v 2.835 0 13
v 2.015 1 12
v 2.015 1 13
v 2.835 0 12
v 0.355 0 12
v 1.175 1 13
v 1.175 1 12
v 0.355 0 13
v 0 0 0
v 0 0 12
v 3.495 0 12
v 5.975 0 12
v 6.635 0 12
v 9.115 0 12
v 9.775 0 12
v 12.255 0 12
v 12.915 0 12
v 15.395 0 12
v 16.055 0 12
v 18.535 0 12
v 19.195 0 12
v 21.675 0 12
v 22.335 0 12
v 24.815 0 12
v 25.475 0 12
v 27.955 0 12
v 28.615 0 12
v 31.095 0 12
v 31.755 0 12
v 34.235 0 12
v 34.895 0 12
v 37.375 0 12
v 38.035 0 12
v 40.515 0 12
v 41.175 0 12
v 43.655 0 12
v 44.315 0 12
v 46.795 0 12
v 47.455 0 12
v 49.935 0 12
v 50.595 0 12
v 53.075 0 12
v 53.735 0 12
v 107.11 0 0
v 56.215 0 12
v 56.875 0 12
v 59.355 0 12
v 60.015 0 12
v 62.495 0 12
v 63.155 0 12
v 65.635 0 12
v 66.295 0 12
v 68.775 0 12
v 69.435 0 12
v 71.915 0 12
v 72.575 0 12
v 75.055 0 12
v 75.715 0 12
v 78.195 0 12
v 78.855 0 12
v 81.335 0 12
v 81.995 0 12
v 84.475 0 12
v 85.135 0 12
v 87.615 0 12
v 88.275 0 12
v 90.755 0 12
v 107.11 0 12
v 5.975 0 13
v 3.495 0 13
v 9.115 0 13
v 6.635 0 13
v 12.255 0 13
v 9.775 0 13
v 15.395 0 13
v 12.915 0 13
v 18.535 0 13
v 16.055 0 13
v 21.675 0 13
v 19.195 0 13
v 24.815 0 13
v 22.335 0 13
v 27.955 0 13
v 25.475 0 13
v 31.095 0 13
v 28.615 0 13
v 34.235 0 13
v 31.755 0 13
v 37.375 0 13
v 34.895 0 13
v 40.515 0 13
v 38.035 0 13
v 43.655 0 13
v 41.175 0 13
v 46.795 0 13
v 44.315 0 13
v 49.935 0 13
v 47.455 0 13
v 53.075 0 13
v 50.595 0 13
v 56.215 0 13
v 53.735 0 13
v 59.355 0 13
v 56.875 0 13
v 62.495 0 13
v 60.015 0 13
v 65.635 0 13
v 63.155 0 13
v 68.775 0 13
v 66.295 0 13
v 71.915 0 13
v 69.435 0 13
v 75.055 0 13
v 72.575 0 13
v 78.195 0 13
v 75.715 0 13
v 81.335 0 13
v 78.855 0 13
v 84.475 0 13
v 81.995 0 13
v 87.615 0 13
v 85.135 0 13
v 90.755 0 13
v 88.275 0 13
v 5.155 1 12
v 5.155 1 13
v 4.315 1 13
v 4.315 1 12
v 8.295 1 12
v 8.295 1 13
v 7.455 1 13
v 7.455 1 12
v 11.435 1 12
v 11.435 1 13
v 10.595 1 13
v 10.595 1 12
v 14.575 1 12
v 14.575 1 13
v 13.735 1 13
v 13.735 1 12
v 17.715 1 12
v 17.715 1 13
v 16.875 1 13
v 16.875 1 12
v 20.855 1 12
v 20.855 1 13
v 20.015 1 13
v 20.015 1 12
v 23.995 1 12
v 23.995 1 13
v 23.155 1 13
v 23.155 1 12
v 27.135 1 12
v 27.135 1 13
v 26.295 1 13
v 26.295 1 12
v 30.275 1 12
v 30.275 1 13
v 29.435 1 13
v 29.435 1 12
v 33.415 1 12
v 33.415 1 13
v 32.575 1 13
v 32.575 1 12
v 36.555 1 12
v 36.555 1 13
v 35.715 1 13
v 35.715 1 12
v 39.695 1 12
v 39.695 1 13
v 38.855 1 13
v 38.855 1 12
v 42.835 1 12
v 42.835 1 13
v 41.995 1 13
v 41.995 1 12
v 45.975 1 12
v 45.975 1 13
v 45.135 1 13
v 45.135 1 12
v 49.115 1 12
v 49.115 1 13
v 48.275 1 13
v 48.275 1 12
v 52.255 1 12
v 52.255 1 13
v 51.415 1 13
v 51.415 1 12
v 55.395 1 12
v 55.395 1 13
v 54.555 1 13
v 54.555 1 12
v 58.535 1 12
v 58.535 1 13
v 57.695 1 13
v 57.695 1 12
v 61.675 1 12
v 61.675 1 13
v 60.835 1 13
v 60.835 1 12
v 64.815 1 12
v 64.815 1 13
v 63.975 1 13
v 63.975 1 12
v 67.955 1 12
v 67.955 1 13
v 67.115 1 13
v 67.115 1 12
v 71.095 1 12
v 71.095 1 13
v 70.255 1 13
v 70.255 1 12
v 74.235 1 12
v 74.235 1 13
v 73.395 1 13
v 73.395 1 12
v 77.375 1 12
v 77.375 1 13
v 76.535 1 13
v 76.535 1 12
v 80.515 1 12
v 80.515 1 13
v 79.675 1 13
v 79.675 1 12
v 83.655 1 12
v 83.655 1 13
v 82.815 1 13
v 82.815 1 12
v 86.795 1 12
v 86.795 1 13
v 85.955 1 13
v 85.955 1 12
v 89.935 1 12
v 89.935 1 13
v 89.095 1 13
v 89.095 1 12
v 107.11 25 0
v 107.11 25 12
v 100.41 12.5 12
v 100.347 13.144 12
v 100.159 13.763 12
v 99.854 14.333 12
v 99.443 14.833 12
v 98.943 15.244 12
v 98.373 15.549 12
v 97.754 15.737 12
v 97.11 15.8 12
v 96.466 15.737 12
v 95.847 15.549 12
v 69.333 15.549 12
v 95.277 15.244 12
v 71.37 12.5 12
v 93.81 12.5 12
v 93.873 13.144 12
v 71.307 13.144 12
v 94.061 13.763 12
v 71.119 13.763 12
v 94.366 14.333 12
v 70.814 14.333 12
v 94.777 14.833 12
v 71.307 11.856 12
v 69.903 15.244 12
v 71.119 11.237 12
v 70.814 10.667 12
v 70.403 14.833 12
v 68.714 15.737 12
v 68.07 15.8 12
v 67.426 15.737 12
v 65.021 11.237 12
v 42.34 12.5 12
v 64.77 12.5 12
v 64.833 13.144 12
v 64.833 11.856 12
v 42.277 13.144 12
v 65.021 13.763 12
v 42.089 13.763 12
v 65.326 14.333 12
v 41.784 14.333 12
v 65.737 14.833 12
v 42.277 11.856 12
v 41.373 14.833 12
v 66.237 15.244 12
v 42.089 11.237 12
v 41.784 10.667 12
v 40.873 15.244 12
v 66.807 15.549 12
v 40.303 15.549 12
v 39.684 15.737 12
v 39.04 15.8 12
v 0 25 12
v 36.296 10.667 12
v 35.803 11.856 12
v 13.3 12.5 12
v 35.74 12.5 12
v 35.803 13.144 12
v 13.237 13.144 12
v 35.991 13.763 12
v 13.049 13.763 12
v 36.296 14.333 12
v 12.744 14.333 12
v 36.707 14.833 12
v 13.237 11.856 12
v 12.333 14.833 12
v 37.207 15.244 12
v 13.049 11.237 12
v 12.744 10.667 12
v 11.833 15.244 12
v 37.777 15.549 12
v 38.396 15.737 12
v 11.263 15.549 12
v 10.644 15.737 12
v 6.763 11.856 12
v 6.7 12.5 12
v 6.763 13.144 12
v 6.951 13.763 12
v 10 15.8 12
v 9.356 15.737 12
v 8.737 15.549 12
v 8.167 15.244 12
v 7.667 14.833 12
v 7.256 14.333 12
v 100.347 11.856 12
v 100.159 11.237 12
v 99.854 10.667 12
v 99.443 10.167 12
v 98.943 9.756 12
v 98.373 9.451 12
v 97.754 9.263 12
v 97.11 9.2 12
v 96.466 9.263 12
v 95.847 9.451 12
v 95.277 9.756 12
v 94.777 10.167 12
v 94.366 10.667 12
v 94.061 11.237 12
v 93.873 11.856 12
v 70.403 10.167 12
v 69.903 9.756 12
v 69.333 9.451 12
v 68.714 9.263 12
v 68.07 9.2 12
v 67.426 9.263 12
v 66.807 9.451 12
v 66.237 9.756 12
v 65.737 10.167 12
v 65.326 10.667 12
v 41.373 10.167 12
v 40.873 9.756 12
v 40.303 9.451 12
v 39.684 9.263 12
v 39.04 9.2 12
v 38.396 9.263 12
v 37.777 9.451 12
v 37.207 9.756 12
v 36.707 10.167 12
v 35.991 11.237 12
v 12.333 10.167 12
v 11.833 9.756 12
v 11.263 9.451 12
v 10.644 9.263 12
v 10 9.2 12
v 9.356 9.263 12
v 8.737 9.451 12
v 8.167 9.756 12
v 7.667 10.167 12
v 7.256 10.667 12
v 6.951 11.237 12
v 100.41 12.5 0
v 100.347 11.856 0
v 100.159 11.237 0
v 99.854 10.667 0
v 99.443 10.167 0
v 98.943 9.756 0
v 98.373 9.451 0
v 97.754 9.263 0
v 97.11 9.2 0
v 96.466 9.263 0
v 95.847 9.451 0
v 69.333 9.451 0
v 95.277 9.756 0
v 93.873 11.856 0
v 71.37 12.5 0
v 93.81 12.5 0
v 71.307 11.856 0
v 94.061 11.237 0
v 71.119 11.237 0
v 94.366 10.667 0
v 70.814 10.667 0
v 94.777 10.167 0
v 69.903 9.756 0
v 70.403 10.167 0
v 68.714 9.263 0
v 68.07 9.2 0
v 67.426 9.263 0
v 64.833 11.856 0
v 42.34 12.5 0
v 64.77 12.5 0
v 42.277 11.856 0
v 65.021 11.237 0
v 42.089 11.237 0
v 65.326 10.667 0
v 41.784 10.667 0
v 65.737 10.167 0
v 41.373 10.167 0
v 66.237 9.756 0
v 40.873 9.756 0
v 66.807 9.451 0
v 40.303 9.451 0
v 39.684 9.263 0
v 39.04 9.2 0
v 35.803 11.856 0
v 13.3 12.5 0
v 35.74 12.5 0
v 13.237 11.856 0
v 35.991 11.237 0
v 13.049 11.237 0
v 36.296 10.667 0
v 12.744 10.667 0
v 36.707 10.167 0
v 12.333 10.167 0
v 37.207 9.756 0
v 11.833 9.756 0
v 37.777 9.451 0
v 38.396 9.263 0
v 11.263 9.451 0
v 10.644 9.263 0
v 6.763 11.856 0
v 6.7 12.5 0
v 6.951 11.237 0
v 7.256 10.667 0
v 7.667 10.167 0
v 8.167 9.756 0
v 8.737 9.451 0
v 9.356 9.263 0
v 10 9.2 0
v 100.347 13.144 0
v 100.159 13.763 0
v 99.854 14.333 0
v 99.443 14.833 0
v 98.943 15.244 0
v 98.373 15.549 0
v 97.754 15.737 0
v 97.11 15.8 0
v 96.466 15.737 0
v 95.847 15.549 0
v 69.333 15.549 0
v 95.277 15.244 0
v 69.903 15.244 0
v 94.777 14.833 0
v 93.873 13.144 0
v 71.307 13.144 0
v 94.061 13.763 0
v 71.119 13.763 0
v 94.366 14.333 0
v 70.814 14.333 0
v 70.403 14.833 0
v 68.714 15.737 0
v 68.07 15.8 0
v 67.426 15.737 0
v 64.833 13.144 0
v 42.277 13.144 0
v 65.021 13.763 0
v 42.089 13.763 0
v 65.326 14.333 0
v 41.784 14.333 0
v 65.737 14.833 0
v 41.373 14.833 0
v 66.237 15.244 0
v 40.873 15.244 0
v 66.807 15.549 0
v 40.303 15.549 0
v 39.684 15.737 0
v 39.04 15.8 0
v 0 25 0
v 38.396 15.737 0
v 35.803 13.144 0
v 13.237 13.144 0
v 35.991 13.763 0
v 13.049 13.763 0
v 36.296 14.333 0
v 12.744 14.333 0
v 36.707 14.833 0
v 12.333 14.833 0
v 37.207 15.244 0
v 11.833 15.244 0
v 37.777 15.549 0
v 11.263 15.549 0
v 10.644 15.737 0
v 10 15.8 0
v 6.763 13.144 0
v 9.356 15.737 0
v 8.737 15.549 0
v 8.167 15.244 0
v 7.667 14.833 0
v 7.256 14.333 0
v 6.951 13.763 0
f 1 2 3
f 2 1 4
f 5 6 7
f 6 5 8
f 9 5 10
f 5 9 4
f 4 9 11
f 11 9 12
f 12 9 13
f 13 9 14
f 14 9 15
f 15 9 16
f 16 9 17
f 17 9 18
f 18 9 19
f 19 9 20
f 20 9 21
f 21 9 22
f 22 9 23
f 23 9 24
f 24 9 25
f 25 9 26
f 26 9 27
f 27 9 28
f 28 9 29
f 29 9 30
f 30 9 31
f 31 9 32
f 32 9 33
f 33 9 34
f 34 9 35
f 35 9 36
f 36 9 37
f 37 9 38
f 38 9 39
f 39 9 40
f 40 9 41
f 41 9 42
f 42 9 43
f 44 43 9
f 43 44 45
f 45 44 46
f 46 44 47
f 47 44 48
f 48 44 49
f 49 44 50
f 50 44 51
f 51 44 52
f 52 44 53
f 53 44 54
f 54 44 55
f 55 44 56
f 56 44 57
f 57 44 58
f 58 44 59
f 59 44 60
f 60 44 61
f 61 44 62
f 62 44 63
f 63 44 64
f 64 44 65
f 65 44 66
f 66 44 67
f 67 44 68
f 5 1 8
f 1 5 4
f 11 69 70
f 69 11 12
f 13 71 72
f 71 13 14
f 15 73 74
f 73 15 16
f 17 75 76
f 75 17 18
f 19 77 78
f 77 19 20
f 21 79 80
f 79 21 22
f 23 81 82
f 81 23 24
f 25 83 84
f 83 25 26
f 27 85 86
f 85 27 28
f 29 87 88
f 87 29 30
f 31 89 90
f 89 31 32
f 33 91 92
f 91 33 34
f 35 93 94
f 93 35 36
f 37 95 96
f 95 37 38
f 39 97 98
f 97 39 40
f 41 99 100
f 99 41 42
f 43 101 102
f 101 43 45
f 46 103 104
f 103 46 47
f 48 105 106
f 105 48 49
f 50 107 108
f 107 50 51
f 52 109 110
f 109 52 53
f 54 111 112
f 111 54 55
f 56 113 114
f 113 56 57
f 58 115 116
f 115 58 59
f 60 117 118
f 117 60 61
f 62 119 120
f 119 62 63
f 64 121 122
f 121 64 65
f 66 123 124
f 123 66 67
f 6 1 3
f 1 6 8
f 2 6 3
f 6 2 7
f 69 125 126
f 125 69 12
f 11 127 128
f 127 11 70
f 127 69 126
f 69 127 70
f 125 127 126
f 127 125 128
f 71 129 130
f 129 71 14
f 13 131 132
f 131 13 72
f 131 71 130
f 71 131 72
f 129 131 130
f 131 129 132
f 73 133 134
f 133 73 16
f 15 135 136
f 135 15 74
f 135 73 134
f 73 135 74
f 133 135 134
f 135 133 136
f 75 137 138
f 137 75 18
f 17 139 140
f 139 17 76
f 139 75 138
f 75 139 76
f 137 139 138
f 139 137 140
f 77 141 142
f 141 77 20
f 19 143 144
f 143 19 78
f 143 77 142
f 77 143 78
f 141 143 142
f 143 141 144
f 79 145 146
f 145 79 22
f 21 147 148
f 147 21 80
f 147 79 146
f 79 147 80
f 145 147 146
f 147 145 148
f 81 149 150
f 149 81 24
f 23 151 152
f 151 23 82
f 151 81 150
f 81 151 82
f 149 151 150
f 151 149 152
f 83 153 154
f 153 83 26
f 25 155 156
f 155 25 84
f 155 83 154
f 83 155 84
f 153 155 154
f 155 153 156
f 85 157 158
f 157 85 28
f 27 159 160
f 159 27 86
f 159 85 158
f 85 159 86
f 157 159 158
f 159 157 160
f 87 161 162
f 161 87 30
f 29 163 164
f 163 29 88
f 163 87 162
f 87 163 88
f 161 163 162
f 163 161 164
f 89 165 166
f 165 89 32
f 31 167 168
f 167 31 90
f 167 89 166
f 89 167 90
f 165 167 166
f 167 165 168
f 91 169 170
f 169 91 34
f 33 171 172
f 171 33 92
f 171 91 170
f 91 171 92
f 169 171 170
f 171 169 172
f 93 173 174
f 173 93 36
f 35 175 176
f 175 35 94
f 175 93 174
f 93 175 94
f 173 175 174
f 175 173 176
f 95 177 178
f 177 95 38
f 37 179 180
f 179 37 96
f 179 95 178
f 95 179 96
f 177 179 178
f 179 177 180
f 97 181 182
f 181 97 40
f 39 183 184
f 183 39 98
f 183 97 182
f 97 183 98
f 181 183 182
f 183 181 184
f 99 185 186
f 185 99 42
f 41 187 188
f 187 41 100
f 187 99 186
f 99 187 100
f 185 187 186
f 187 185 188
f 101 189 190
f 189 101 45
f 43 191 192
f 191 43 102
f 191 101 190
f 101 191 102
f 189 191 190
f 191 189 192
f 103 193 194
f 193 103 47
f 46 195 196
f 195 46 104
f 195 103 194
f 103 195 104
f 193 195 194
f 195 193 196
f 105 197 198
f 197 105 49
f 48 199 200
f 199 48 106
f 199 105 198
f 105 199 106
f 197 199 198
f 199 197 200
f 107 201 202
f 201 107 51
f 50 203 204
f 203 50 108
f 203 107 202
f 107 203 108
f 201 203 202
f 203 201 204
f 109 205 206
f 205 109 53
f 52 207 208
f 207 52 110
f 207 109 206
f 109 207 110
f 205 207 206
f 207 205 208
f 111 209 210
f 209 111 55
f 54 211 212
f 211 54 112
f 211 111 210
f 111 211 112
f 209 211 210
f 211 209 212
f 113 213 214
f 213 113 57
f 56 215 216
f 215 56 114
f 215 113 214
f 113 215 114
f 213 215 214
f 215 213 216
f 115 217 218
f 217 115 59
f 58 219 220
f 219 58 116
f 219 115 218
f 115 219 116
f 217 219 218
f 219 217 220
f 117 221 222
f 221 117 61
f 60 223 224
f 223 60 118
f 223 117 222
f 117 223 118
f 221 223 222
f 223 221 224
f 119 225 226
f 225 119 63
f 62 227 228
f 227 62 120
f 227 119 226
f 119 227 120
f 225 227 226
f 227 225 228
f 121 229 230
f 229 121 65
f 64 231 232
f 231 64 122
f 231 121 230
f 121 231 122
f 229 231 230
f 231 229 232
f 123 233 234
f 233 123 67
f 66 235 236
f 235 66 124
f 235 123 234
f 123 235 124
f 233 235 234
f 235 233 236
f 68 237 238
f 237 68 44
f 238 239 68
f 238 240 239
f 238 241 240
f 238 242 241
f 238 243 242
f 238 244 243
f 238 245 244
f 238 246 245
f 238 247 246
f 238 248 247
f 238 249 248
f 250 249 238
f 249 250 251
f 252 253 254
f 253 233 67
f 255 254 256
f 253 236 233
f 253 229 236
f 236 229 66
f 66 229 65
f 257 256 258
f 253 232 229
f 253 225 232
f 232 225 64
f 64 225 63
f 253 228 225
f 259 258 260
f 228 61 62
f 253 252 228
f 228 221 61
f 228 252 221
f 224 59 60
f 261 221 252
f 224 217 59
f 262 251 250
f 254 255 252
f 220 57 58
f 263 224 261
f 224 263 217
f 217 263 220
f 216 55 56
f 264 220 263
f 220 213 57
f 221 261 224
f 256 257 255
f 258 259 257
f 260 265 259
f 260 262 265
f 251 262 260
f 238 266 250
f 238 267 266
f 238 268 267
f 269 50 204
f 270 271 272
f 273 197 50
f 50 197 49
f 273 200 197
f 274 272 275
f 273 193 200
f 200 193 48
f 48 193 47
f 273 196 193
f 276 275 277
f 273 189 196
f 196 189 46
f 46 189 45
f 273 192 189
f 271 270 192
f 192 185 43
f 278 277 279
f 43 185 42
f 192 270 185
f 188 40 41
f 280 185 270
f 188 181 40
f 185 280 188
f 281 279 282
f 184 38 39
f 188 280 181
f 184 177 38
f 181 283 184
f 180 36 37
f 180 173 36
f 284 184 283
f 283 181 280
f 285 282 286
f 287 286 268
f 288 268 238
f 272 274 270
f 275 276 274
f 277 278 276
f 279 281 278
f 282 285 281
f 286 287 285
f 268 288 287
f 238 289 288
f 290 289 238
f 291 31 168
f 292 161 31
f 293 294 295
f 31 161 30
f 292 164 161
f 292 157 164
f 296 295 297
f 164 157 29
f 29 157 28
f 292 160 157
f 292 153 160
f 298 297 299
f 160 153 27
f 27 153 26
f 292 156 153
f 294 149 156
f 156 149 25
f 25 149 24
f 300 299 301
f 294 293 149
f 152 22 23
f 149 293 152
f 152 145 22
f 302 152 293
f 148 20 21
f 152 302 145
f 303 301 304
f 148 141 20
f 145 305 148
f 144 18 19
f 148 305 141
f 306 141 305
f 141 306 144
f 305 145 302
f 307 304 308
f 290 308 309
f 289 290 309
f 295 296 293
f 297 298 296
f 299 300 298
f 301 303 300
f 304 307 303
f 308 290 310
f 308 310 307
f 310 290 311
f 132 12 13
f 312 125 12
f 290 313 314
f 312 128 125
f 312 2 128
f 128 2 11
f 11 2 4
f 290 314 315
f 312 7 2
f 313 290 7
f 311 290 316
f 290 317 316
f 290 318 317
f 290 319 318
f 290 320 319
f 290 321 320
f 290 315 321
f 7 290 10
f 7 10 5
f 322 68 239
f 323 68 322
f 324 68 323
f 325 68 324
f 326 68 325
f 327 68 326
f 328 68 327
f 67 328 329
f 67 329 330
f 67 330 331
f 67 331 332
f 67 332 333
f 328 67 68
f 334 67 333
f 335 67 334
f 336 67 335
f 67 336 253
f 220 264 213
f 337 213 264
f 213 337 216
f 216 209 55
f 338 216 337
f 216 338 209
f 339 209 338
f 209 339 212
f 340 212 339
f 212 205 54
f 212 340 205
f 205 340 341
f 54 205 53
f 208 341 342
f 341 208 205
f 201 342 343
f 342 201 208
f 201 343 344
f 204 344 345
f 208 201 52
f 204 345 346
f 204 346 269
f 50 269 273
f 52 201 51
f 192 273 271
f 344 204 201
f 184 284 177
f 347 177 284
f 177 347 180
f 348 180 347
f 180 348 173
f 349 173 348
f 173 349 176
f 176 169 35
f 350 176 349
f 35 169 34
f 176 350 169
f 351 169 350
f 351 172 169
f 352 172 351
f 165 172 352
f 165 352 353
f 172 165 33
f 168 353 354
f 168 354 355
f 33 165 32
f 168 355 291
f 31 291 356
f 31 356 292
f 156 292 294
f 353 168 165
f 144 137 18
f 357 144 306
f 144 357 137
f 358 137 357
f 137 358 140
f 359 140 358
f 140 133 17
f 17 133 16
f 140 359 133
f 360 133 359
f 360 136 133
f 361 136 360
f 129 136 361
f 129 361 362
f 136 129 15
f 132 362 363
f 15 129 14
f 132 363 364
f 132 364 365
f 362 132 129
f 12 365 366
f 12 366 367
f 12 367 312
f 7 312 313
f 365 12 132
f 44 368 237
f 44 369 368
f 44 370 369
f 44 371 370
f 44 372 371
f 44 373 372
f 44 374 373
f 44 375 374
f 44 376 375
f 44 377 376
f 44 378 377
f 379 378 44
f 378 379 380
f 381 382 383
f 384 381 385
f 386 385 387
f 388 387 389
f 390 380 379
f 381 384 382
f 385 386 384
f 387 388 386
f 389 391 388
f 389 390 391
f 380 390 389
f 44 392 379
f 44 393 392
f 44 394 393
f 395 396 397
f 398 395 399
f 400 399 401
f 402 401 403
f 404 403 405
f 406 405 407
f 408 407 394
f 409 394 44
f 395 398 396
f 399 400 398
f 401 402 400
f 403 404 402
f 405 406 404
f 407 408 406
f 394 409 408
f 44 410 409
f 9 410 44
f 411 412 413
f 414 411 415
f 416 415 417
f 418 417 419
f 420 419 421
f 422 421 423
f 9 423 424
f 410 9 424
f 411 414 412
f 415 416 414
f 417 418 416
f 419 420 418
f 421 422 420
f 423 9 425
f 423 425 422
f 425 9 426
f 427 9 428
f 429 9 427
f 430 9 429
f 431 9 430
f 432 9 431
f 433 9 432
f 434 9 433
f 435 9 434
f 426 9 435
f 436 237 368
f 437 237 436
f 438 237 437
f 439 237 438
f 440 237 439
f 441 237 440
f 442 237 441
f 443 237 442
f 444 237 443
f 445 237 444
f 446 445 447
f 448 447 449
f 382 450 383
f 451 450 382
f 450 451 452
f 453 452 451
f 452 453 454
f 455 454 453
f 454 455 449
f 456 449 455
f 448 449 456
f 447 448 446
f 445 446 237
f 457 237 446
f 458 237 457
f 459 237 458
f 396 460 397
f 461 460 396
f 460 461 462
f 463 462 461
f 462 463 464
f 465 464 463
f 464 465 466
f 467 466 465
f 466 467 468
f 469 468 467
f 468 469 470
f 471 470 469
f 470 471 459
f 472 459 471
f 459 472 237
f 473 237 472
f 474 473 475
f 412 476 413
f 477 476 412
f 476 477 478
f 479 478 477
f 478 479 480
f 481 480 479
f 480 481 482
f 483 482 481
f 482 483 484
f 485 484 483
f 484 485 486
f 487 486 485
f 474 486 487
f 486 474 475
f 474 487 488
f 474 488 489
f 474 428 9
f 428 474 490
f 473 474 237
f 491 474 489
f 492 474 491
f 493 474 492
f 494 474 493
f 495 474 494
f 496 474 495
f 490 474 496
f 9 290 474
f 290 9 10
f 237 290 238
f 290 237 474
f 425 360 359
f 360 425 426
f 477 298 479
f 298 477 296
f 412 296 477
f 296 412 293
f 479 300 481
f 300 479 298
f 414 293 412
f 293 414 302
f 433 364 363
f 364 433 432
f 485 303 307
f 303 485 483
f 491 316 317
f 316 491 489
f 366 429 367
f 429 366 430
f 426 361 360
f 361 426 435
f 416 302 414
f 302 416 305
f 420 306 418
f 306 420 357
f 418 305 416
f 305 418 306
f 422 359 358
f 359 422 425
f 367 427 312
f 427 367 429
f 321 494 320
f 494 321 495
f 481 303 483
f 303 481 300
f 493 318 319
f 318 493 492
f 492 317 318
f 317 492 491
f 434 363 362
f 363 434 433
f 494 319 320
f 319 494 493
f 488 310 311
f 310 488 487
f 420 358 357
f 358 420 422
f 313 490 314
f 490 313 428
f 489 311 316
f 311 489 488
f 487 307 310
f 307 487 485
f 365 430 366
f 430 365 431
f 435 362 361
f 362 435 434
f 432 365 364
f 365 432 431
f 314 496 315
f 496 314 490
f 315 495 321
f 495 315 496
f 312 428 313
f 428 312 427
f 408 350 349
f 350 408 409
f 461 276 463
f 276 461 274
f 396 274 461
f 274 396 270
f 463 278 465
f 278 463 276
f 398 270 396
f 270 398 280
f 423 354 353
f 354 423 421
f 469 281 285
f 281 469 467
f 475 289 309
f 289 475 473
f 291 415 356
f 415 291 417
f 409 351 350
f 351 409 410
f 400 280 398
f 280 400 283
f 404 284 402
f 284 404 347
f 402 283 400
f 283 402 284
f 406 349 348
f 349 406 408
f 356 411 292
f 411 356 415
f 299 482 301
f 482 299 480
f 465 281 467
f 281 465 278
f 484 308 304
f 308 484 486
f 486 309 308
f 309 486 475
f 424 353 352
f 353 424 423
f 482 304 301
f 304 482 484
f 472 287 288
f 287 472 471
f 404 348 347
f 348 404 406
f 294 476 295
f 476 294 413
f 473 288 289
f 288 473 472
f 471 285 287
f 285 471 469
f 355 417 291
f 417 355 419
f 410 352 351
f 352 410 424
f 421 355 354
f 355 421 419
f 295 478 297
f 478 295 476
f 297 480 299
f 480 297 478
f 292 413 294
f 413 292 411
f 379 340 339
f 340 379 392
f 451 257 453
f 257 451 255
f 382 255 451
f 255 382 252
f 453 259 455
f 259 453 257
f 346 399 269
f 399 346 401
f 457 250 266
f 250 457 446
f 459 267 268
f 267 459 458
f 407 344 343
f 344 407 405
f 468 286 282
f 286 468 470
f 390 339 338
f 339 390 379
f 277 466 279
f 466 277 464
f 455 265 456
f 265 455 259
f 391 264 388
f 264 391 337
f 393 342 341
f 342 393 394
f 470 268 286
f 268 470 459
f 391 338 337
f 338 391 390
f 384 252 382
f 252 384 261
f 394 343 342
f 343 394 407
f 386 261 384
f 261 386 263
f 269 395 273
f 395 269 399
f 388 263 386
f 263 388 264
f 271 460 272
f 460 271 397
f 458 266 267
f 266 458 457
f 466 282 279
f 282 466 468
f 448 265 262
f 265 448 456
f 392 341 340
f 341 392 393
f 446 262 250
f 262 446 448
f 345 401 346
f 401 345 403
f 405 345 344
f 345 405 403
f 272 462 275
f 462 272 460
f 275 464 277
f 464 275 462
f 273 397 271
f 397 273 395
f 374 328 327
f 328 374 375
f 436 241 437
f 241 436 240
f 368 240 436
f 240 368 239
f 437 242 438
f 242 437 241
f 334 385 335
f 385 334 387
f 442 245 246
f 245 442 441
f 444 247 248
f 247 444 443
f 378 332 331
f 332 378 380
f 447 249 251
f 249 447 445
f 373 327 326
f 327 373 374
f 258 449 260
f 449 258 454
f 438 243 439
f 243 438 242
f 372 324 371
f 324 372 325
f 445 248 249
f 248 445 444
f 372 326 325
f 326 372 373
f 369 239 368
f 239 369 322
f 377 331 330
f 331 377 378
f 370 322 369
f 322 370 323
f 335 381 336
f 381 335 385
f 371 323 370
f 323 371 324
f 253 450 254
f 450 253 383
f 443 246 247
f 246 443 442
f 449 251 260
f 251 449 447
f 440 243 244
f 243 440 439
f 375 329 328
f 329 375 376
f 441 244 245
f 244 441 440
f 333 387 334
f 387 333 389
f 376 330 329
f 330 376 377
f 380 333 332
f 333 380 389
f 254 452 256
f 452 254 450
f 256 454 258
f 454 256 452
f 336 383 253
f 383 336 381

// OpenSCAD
$fn = 32;

// ----------------------------------------------------------------------
// Gear rack: m=1 z=29, 107.11 x 25 x 13 mm
// ----------------------------------------------------------------------

// --- parameters (mm) ---
length = 107.11;          // rack length, X
width = 25;               // rack width, Y
height = 13;              // overall height, Z
module_m = 1;             // module
back_t = 12;              // tooth root line height
pitch = 3.14;             // circular pitch
tip_w = 0.84;             // tooth thickness at the tip
root_w = 2.48;            // tooth thickness at the root line
hole_d = 6.6;             // mounting hole
sink = 0.6;               // tooth root overlap into the body

tooth_span = 91.11;

module tooth(x0) {
  /* 20 deg flank profile, sunk into the body for a positive overlap */
  translate([x0, 0, back_t - sink])
    linear_extrude(height = height - back_t + sink)
      polygon(points = [[-root_w / 2, 0], [root_w / 2, 0],
                        [tip_w / 2, height - back_t],
                        [-tip_w / 2, height - back_t]]);
}

difference() {
  union() {
    cube([length, width, back_t]);
    for (i = [0 : 29 - 1])
      tooth((i + 0.5) * pitch + (tooth_span - 29 * pitch) / 2);
  }
  translate([10, 12.5, -1]) cylinder(h = back_t + 2, d = hole_d);
  translate([39.04, 12.5, -1]) cylinder(h = back_t + 2, d = hole_d);
  translate([68.07, 12.5, -1]) cylinder(h = back_t + 2, d = hole_d);
  translate([97.11, 12.5, -1]) cylinder(h = back_t + 2, d = hole_d);
}
